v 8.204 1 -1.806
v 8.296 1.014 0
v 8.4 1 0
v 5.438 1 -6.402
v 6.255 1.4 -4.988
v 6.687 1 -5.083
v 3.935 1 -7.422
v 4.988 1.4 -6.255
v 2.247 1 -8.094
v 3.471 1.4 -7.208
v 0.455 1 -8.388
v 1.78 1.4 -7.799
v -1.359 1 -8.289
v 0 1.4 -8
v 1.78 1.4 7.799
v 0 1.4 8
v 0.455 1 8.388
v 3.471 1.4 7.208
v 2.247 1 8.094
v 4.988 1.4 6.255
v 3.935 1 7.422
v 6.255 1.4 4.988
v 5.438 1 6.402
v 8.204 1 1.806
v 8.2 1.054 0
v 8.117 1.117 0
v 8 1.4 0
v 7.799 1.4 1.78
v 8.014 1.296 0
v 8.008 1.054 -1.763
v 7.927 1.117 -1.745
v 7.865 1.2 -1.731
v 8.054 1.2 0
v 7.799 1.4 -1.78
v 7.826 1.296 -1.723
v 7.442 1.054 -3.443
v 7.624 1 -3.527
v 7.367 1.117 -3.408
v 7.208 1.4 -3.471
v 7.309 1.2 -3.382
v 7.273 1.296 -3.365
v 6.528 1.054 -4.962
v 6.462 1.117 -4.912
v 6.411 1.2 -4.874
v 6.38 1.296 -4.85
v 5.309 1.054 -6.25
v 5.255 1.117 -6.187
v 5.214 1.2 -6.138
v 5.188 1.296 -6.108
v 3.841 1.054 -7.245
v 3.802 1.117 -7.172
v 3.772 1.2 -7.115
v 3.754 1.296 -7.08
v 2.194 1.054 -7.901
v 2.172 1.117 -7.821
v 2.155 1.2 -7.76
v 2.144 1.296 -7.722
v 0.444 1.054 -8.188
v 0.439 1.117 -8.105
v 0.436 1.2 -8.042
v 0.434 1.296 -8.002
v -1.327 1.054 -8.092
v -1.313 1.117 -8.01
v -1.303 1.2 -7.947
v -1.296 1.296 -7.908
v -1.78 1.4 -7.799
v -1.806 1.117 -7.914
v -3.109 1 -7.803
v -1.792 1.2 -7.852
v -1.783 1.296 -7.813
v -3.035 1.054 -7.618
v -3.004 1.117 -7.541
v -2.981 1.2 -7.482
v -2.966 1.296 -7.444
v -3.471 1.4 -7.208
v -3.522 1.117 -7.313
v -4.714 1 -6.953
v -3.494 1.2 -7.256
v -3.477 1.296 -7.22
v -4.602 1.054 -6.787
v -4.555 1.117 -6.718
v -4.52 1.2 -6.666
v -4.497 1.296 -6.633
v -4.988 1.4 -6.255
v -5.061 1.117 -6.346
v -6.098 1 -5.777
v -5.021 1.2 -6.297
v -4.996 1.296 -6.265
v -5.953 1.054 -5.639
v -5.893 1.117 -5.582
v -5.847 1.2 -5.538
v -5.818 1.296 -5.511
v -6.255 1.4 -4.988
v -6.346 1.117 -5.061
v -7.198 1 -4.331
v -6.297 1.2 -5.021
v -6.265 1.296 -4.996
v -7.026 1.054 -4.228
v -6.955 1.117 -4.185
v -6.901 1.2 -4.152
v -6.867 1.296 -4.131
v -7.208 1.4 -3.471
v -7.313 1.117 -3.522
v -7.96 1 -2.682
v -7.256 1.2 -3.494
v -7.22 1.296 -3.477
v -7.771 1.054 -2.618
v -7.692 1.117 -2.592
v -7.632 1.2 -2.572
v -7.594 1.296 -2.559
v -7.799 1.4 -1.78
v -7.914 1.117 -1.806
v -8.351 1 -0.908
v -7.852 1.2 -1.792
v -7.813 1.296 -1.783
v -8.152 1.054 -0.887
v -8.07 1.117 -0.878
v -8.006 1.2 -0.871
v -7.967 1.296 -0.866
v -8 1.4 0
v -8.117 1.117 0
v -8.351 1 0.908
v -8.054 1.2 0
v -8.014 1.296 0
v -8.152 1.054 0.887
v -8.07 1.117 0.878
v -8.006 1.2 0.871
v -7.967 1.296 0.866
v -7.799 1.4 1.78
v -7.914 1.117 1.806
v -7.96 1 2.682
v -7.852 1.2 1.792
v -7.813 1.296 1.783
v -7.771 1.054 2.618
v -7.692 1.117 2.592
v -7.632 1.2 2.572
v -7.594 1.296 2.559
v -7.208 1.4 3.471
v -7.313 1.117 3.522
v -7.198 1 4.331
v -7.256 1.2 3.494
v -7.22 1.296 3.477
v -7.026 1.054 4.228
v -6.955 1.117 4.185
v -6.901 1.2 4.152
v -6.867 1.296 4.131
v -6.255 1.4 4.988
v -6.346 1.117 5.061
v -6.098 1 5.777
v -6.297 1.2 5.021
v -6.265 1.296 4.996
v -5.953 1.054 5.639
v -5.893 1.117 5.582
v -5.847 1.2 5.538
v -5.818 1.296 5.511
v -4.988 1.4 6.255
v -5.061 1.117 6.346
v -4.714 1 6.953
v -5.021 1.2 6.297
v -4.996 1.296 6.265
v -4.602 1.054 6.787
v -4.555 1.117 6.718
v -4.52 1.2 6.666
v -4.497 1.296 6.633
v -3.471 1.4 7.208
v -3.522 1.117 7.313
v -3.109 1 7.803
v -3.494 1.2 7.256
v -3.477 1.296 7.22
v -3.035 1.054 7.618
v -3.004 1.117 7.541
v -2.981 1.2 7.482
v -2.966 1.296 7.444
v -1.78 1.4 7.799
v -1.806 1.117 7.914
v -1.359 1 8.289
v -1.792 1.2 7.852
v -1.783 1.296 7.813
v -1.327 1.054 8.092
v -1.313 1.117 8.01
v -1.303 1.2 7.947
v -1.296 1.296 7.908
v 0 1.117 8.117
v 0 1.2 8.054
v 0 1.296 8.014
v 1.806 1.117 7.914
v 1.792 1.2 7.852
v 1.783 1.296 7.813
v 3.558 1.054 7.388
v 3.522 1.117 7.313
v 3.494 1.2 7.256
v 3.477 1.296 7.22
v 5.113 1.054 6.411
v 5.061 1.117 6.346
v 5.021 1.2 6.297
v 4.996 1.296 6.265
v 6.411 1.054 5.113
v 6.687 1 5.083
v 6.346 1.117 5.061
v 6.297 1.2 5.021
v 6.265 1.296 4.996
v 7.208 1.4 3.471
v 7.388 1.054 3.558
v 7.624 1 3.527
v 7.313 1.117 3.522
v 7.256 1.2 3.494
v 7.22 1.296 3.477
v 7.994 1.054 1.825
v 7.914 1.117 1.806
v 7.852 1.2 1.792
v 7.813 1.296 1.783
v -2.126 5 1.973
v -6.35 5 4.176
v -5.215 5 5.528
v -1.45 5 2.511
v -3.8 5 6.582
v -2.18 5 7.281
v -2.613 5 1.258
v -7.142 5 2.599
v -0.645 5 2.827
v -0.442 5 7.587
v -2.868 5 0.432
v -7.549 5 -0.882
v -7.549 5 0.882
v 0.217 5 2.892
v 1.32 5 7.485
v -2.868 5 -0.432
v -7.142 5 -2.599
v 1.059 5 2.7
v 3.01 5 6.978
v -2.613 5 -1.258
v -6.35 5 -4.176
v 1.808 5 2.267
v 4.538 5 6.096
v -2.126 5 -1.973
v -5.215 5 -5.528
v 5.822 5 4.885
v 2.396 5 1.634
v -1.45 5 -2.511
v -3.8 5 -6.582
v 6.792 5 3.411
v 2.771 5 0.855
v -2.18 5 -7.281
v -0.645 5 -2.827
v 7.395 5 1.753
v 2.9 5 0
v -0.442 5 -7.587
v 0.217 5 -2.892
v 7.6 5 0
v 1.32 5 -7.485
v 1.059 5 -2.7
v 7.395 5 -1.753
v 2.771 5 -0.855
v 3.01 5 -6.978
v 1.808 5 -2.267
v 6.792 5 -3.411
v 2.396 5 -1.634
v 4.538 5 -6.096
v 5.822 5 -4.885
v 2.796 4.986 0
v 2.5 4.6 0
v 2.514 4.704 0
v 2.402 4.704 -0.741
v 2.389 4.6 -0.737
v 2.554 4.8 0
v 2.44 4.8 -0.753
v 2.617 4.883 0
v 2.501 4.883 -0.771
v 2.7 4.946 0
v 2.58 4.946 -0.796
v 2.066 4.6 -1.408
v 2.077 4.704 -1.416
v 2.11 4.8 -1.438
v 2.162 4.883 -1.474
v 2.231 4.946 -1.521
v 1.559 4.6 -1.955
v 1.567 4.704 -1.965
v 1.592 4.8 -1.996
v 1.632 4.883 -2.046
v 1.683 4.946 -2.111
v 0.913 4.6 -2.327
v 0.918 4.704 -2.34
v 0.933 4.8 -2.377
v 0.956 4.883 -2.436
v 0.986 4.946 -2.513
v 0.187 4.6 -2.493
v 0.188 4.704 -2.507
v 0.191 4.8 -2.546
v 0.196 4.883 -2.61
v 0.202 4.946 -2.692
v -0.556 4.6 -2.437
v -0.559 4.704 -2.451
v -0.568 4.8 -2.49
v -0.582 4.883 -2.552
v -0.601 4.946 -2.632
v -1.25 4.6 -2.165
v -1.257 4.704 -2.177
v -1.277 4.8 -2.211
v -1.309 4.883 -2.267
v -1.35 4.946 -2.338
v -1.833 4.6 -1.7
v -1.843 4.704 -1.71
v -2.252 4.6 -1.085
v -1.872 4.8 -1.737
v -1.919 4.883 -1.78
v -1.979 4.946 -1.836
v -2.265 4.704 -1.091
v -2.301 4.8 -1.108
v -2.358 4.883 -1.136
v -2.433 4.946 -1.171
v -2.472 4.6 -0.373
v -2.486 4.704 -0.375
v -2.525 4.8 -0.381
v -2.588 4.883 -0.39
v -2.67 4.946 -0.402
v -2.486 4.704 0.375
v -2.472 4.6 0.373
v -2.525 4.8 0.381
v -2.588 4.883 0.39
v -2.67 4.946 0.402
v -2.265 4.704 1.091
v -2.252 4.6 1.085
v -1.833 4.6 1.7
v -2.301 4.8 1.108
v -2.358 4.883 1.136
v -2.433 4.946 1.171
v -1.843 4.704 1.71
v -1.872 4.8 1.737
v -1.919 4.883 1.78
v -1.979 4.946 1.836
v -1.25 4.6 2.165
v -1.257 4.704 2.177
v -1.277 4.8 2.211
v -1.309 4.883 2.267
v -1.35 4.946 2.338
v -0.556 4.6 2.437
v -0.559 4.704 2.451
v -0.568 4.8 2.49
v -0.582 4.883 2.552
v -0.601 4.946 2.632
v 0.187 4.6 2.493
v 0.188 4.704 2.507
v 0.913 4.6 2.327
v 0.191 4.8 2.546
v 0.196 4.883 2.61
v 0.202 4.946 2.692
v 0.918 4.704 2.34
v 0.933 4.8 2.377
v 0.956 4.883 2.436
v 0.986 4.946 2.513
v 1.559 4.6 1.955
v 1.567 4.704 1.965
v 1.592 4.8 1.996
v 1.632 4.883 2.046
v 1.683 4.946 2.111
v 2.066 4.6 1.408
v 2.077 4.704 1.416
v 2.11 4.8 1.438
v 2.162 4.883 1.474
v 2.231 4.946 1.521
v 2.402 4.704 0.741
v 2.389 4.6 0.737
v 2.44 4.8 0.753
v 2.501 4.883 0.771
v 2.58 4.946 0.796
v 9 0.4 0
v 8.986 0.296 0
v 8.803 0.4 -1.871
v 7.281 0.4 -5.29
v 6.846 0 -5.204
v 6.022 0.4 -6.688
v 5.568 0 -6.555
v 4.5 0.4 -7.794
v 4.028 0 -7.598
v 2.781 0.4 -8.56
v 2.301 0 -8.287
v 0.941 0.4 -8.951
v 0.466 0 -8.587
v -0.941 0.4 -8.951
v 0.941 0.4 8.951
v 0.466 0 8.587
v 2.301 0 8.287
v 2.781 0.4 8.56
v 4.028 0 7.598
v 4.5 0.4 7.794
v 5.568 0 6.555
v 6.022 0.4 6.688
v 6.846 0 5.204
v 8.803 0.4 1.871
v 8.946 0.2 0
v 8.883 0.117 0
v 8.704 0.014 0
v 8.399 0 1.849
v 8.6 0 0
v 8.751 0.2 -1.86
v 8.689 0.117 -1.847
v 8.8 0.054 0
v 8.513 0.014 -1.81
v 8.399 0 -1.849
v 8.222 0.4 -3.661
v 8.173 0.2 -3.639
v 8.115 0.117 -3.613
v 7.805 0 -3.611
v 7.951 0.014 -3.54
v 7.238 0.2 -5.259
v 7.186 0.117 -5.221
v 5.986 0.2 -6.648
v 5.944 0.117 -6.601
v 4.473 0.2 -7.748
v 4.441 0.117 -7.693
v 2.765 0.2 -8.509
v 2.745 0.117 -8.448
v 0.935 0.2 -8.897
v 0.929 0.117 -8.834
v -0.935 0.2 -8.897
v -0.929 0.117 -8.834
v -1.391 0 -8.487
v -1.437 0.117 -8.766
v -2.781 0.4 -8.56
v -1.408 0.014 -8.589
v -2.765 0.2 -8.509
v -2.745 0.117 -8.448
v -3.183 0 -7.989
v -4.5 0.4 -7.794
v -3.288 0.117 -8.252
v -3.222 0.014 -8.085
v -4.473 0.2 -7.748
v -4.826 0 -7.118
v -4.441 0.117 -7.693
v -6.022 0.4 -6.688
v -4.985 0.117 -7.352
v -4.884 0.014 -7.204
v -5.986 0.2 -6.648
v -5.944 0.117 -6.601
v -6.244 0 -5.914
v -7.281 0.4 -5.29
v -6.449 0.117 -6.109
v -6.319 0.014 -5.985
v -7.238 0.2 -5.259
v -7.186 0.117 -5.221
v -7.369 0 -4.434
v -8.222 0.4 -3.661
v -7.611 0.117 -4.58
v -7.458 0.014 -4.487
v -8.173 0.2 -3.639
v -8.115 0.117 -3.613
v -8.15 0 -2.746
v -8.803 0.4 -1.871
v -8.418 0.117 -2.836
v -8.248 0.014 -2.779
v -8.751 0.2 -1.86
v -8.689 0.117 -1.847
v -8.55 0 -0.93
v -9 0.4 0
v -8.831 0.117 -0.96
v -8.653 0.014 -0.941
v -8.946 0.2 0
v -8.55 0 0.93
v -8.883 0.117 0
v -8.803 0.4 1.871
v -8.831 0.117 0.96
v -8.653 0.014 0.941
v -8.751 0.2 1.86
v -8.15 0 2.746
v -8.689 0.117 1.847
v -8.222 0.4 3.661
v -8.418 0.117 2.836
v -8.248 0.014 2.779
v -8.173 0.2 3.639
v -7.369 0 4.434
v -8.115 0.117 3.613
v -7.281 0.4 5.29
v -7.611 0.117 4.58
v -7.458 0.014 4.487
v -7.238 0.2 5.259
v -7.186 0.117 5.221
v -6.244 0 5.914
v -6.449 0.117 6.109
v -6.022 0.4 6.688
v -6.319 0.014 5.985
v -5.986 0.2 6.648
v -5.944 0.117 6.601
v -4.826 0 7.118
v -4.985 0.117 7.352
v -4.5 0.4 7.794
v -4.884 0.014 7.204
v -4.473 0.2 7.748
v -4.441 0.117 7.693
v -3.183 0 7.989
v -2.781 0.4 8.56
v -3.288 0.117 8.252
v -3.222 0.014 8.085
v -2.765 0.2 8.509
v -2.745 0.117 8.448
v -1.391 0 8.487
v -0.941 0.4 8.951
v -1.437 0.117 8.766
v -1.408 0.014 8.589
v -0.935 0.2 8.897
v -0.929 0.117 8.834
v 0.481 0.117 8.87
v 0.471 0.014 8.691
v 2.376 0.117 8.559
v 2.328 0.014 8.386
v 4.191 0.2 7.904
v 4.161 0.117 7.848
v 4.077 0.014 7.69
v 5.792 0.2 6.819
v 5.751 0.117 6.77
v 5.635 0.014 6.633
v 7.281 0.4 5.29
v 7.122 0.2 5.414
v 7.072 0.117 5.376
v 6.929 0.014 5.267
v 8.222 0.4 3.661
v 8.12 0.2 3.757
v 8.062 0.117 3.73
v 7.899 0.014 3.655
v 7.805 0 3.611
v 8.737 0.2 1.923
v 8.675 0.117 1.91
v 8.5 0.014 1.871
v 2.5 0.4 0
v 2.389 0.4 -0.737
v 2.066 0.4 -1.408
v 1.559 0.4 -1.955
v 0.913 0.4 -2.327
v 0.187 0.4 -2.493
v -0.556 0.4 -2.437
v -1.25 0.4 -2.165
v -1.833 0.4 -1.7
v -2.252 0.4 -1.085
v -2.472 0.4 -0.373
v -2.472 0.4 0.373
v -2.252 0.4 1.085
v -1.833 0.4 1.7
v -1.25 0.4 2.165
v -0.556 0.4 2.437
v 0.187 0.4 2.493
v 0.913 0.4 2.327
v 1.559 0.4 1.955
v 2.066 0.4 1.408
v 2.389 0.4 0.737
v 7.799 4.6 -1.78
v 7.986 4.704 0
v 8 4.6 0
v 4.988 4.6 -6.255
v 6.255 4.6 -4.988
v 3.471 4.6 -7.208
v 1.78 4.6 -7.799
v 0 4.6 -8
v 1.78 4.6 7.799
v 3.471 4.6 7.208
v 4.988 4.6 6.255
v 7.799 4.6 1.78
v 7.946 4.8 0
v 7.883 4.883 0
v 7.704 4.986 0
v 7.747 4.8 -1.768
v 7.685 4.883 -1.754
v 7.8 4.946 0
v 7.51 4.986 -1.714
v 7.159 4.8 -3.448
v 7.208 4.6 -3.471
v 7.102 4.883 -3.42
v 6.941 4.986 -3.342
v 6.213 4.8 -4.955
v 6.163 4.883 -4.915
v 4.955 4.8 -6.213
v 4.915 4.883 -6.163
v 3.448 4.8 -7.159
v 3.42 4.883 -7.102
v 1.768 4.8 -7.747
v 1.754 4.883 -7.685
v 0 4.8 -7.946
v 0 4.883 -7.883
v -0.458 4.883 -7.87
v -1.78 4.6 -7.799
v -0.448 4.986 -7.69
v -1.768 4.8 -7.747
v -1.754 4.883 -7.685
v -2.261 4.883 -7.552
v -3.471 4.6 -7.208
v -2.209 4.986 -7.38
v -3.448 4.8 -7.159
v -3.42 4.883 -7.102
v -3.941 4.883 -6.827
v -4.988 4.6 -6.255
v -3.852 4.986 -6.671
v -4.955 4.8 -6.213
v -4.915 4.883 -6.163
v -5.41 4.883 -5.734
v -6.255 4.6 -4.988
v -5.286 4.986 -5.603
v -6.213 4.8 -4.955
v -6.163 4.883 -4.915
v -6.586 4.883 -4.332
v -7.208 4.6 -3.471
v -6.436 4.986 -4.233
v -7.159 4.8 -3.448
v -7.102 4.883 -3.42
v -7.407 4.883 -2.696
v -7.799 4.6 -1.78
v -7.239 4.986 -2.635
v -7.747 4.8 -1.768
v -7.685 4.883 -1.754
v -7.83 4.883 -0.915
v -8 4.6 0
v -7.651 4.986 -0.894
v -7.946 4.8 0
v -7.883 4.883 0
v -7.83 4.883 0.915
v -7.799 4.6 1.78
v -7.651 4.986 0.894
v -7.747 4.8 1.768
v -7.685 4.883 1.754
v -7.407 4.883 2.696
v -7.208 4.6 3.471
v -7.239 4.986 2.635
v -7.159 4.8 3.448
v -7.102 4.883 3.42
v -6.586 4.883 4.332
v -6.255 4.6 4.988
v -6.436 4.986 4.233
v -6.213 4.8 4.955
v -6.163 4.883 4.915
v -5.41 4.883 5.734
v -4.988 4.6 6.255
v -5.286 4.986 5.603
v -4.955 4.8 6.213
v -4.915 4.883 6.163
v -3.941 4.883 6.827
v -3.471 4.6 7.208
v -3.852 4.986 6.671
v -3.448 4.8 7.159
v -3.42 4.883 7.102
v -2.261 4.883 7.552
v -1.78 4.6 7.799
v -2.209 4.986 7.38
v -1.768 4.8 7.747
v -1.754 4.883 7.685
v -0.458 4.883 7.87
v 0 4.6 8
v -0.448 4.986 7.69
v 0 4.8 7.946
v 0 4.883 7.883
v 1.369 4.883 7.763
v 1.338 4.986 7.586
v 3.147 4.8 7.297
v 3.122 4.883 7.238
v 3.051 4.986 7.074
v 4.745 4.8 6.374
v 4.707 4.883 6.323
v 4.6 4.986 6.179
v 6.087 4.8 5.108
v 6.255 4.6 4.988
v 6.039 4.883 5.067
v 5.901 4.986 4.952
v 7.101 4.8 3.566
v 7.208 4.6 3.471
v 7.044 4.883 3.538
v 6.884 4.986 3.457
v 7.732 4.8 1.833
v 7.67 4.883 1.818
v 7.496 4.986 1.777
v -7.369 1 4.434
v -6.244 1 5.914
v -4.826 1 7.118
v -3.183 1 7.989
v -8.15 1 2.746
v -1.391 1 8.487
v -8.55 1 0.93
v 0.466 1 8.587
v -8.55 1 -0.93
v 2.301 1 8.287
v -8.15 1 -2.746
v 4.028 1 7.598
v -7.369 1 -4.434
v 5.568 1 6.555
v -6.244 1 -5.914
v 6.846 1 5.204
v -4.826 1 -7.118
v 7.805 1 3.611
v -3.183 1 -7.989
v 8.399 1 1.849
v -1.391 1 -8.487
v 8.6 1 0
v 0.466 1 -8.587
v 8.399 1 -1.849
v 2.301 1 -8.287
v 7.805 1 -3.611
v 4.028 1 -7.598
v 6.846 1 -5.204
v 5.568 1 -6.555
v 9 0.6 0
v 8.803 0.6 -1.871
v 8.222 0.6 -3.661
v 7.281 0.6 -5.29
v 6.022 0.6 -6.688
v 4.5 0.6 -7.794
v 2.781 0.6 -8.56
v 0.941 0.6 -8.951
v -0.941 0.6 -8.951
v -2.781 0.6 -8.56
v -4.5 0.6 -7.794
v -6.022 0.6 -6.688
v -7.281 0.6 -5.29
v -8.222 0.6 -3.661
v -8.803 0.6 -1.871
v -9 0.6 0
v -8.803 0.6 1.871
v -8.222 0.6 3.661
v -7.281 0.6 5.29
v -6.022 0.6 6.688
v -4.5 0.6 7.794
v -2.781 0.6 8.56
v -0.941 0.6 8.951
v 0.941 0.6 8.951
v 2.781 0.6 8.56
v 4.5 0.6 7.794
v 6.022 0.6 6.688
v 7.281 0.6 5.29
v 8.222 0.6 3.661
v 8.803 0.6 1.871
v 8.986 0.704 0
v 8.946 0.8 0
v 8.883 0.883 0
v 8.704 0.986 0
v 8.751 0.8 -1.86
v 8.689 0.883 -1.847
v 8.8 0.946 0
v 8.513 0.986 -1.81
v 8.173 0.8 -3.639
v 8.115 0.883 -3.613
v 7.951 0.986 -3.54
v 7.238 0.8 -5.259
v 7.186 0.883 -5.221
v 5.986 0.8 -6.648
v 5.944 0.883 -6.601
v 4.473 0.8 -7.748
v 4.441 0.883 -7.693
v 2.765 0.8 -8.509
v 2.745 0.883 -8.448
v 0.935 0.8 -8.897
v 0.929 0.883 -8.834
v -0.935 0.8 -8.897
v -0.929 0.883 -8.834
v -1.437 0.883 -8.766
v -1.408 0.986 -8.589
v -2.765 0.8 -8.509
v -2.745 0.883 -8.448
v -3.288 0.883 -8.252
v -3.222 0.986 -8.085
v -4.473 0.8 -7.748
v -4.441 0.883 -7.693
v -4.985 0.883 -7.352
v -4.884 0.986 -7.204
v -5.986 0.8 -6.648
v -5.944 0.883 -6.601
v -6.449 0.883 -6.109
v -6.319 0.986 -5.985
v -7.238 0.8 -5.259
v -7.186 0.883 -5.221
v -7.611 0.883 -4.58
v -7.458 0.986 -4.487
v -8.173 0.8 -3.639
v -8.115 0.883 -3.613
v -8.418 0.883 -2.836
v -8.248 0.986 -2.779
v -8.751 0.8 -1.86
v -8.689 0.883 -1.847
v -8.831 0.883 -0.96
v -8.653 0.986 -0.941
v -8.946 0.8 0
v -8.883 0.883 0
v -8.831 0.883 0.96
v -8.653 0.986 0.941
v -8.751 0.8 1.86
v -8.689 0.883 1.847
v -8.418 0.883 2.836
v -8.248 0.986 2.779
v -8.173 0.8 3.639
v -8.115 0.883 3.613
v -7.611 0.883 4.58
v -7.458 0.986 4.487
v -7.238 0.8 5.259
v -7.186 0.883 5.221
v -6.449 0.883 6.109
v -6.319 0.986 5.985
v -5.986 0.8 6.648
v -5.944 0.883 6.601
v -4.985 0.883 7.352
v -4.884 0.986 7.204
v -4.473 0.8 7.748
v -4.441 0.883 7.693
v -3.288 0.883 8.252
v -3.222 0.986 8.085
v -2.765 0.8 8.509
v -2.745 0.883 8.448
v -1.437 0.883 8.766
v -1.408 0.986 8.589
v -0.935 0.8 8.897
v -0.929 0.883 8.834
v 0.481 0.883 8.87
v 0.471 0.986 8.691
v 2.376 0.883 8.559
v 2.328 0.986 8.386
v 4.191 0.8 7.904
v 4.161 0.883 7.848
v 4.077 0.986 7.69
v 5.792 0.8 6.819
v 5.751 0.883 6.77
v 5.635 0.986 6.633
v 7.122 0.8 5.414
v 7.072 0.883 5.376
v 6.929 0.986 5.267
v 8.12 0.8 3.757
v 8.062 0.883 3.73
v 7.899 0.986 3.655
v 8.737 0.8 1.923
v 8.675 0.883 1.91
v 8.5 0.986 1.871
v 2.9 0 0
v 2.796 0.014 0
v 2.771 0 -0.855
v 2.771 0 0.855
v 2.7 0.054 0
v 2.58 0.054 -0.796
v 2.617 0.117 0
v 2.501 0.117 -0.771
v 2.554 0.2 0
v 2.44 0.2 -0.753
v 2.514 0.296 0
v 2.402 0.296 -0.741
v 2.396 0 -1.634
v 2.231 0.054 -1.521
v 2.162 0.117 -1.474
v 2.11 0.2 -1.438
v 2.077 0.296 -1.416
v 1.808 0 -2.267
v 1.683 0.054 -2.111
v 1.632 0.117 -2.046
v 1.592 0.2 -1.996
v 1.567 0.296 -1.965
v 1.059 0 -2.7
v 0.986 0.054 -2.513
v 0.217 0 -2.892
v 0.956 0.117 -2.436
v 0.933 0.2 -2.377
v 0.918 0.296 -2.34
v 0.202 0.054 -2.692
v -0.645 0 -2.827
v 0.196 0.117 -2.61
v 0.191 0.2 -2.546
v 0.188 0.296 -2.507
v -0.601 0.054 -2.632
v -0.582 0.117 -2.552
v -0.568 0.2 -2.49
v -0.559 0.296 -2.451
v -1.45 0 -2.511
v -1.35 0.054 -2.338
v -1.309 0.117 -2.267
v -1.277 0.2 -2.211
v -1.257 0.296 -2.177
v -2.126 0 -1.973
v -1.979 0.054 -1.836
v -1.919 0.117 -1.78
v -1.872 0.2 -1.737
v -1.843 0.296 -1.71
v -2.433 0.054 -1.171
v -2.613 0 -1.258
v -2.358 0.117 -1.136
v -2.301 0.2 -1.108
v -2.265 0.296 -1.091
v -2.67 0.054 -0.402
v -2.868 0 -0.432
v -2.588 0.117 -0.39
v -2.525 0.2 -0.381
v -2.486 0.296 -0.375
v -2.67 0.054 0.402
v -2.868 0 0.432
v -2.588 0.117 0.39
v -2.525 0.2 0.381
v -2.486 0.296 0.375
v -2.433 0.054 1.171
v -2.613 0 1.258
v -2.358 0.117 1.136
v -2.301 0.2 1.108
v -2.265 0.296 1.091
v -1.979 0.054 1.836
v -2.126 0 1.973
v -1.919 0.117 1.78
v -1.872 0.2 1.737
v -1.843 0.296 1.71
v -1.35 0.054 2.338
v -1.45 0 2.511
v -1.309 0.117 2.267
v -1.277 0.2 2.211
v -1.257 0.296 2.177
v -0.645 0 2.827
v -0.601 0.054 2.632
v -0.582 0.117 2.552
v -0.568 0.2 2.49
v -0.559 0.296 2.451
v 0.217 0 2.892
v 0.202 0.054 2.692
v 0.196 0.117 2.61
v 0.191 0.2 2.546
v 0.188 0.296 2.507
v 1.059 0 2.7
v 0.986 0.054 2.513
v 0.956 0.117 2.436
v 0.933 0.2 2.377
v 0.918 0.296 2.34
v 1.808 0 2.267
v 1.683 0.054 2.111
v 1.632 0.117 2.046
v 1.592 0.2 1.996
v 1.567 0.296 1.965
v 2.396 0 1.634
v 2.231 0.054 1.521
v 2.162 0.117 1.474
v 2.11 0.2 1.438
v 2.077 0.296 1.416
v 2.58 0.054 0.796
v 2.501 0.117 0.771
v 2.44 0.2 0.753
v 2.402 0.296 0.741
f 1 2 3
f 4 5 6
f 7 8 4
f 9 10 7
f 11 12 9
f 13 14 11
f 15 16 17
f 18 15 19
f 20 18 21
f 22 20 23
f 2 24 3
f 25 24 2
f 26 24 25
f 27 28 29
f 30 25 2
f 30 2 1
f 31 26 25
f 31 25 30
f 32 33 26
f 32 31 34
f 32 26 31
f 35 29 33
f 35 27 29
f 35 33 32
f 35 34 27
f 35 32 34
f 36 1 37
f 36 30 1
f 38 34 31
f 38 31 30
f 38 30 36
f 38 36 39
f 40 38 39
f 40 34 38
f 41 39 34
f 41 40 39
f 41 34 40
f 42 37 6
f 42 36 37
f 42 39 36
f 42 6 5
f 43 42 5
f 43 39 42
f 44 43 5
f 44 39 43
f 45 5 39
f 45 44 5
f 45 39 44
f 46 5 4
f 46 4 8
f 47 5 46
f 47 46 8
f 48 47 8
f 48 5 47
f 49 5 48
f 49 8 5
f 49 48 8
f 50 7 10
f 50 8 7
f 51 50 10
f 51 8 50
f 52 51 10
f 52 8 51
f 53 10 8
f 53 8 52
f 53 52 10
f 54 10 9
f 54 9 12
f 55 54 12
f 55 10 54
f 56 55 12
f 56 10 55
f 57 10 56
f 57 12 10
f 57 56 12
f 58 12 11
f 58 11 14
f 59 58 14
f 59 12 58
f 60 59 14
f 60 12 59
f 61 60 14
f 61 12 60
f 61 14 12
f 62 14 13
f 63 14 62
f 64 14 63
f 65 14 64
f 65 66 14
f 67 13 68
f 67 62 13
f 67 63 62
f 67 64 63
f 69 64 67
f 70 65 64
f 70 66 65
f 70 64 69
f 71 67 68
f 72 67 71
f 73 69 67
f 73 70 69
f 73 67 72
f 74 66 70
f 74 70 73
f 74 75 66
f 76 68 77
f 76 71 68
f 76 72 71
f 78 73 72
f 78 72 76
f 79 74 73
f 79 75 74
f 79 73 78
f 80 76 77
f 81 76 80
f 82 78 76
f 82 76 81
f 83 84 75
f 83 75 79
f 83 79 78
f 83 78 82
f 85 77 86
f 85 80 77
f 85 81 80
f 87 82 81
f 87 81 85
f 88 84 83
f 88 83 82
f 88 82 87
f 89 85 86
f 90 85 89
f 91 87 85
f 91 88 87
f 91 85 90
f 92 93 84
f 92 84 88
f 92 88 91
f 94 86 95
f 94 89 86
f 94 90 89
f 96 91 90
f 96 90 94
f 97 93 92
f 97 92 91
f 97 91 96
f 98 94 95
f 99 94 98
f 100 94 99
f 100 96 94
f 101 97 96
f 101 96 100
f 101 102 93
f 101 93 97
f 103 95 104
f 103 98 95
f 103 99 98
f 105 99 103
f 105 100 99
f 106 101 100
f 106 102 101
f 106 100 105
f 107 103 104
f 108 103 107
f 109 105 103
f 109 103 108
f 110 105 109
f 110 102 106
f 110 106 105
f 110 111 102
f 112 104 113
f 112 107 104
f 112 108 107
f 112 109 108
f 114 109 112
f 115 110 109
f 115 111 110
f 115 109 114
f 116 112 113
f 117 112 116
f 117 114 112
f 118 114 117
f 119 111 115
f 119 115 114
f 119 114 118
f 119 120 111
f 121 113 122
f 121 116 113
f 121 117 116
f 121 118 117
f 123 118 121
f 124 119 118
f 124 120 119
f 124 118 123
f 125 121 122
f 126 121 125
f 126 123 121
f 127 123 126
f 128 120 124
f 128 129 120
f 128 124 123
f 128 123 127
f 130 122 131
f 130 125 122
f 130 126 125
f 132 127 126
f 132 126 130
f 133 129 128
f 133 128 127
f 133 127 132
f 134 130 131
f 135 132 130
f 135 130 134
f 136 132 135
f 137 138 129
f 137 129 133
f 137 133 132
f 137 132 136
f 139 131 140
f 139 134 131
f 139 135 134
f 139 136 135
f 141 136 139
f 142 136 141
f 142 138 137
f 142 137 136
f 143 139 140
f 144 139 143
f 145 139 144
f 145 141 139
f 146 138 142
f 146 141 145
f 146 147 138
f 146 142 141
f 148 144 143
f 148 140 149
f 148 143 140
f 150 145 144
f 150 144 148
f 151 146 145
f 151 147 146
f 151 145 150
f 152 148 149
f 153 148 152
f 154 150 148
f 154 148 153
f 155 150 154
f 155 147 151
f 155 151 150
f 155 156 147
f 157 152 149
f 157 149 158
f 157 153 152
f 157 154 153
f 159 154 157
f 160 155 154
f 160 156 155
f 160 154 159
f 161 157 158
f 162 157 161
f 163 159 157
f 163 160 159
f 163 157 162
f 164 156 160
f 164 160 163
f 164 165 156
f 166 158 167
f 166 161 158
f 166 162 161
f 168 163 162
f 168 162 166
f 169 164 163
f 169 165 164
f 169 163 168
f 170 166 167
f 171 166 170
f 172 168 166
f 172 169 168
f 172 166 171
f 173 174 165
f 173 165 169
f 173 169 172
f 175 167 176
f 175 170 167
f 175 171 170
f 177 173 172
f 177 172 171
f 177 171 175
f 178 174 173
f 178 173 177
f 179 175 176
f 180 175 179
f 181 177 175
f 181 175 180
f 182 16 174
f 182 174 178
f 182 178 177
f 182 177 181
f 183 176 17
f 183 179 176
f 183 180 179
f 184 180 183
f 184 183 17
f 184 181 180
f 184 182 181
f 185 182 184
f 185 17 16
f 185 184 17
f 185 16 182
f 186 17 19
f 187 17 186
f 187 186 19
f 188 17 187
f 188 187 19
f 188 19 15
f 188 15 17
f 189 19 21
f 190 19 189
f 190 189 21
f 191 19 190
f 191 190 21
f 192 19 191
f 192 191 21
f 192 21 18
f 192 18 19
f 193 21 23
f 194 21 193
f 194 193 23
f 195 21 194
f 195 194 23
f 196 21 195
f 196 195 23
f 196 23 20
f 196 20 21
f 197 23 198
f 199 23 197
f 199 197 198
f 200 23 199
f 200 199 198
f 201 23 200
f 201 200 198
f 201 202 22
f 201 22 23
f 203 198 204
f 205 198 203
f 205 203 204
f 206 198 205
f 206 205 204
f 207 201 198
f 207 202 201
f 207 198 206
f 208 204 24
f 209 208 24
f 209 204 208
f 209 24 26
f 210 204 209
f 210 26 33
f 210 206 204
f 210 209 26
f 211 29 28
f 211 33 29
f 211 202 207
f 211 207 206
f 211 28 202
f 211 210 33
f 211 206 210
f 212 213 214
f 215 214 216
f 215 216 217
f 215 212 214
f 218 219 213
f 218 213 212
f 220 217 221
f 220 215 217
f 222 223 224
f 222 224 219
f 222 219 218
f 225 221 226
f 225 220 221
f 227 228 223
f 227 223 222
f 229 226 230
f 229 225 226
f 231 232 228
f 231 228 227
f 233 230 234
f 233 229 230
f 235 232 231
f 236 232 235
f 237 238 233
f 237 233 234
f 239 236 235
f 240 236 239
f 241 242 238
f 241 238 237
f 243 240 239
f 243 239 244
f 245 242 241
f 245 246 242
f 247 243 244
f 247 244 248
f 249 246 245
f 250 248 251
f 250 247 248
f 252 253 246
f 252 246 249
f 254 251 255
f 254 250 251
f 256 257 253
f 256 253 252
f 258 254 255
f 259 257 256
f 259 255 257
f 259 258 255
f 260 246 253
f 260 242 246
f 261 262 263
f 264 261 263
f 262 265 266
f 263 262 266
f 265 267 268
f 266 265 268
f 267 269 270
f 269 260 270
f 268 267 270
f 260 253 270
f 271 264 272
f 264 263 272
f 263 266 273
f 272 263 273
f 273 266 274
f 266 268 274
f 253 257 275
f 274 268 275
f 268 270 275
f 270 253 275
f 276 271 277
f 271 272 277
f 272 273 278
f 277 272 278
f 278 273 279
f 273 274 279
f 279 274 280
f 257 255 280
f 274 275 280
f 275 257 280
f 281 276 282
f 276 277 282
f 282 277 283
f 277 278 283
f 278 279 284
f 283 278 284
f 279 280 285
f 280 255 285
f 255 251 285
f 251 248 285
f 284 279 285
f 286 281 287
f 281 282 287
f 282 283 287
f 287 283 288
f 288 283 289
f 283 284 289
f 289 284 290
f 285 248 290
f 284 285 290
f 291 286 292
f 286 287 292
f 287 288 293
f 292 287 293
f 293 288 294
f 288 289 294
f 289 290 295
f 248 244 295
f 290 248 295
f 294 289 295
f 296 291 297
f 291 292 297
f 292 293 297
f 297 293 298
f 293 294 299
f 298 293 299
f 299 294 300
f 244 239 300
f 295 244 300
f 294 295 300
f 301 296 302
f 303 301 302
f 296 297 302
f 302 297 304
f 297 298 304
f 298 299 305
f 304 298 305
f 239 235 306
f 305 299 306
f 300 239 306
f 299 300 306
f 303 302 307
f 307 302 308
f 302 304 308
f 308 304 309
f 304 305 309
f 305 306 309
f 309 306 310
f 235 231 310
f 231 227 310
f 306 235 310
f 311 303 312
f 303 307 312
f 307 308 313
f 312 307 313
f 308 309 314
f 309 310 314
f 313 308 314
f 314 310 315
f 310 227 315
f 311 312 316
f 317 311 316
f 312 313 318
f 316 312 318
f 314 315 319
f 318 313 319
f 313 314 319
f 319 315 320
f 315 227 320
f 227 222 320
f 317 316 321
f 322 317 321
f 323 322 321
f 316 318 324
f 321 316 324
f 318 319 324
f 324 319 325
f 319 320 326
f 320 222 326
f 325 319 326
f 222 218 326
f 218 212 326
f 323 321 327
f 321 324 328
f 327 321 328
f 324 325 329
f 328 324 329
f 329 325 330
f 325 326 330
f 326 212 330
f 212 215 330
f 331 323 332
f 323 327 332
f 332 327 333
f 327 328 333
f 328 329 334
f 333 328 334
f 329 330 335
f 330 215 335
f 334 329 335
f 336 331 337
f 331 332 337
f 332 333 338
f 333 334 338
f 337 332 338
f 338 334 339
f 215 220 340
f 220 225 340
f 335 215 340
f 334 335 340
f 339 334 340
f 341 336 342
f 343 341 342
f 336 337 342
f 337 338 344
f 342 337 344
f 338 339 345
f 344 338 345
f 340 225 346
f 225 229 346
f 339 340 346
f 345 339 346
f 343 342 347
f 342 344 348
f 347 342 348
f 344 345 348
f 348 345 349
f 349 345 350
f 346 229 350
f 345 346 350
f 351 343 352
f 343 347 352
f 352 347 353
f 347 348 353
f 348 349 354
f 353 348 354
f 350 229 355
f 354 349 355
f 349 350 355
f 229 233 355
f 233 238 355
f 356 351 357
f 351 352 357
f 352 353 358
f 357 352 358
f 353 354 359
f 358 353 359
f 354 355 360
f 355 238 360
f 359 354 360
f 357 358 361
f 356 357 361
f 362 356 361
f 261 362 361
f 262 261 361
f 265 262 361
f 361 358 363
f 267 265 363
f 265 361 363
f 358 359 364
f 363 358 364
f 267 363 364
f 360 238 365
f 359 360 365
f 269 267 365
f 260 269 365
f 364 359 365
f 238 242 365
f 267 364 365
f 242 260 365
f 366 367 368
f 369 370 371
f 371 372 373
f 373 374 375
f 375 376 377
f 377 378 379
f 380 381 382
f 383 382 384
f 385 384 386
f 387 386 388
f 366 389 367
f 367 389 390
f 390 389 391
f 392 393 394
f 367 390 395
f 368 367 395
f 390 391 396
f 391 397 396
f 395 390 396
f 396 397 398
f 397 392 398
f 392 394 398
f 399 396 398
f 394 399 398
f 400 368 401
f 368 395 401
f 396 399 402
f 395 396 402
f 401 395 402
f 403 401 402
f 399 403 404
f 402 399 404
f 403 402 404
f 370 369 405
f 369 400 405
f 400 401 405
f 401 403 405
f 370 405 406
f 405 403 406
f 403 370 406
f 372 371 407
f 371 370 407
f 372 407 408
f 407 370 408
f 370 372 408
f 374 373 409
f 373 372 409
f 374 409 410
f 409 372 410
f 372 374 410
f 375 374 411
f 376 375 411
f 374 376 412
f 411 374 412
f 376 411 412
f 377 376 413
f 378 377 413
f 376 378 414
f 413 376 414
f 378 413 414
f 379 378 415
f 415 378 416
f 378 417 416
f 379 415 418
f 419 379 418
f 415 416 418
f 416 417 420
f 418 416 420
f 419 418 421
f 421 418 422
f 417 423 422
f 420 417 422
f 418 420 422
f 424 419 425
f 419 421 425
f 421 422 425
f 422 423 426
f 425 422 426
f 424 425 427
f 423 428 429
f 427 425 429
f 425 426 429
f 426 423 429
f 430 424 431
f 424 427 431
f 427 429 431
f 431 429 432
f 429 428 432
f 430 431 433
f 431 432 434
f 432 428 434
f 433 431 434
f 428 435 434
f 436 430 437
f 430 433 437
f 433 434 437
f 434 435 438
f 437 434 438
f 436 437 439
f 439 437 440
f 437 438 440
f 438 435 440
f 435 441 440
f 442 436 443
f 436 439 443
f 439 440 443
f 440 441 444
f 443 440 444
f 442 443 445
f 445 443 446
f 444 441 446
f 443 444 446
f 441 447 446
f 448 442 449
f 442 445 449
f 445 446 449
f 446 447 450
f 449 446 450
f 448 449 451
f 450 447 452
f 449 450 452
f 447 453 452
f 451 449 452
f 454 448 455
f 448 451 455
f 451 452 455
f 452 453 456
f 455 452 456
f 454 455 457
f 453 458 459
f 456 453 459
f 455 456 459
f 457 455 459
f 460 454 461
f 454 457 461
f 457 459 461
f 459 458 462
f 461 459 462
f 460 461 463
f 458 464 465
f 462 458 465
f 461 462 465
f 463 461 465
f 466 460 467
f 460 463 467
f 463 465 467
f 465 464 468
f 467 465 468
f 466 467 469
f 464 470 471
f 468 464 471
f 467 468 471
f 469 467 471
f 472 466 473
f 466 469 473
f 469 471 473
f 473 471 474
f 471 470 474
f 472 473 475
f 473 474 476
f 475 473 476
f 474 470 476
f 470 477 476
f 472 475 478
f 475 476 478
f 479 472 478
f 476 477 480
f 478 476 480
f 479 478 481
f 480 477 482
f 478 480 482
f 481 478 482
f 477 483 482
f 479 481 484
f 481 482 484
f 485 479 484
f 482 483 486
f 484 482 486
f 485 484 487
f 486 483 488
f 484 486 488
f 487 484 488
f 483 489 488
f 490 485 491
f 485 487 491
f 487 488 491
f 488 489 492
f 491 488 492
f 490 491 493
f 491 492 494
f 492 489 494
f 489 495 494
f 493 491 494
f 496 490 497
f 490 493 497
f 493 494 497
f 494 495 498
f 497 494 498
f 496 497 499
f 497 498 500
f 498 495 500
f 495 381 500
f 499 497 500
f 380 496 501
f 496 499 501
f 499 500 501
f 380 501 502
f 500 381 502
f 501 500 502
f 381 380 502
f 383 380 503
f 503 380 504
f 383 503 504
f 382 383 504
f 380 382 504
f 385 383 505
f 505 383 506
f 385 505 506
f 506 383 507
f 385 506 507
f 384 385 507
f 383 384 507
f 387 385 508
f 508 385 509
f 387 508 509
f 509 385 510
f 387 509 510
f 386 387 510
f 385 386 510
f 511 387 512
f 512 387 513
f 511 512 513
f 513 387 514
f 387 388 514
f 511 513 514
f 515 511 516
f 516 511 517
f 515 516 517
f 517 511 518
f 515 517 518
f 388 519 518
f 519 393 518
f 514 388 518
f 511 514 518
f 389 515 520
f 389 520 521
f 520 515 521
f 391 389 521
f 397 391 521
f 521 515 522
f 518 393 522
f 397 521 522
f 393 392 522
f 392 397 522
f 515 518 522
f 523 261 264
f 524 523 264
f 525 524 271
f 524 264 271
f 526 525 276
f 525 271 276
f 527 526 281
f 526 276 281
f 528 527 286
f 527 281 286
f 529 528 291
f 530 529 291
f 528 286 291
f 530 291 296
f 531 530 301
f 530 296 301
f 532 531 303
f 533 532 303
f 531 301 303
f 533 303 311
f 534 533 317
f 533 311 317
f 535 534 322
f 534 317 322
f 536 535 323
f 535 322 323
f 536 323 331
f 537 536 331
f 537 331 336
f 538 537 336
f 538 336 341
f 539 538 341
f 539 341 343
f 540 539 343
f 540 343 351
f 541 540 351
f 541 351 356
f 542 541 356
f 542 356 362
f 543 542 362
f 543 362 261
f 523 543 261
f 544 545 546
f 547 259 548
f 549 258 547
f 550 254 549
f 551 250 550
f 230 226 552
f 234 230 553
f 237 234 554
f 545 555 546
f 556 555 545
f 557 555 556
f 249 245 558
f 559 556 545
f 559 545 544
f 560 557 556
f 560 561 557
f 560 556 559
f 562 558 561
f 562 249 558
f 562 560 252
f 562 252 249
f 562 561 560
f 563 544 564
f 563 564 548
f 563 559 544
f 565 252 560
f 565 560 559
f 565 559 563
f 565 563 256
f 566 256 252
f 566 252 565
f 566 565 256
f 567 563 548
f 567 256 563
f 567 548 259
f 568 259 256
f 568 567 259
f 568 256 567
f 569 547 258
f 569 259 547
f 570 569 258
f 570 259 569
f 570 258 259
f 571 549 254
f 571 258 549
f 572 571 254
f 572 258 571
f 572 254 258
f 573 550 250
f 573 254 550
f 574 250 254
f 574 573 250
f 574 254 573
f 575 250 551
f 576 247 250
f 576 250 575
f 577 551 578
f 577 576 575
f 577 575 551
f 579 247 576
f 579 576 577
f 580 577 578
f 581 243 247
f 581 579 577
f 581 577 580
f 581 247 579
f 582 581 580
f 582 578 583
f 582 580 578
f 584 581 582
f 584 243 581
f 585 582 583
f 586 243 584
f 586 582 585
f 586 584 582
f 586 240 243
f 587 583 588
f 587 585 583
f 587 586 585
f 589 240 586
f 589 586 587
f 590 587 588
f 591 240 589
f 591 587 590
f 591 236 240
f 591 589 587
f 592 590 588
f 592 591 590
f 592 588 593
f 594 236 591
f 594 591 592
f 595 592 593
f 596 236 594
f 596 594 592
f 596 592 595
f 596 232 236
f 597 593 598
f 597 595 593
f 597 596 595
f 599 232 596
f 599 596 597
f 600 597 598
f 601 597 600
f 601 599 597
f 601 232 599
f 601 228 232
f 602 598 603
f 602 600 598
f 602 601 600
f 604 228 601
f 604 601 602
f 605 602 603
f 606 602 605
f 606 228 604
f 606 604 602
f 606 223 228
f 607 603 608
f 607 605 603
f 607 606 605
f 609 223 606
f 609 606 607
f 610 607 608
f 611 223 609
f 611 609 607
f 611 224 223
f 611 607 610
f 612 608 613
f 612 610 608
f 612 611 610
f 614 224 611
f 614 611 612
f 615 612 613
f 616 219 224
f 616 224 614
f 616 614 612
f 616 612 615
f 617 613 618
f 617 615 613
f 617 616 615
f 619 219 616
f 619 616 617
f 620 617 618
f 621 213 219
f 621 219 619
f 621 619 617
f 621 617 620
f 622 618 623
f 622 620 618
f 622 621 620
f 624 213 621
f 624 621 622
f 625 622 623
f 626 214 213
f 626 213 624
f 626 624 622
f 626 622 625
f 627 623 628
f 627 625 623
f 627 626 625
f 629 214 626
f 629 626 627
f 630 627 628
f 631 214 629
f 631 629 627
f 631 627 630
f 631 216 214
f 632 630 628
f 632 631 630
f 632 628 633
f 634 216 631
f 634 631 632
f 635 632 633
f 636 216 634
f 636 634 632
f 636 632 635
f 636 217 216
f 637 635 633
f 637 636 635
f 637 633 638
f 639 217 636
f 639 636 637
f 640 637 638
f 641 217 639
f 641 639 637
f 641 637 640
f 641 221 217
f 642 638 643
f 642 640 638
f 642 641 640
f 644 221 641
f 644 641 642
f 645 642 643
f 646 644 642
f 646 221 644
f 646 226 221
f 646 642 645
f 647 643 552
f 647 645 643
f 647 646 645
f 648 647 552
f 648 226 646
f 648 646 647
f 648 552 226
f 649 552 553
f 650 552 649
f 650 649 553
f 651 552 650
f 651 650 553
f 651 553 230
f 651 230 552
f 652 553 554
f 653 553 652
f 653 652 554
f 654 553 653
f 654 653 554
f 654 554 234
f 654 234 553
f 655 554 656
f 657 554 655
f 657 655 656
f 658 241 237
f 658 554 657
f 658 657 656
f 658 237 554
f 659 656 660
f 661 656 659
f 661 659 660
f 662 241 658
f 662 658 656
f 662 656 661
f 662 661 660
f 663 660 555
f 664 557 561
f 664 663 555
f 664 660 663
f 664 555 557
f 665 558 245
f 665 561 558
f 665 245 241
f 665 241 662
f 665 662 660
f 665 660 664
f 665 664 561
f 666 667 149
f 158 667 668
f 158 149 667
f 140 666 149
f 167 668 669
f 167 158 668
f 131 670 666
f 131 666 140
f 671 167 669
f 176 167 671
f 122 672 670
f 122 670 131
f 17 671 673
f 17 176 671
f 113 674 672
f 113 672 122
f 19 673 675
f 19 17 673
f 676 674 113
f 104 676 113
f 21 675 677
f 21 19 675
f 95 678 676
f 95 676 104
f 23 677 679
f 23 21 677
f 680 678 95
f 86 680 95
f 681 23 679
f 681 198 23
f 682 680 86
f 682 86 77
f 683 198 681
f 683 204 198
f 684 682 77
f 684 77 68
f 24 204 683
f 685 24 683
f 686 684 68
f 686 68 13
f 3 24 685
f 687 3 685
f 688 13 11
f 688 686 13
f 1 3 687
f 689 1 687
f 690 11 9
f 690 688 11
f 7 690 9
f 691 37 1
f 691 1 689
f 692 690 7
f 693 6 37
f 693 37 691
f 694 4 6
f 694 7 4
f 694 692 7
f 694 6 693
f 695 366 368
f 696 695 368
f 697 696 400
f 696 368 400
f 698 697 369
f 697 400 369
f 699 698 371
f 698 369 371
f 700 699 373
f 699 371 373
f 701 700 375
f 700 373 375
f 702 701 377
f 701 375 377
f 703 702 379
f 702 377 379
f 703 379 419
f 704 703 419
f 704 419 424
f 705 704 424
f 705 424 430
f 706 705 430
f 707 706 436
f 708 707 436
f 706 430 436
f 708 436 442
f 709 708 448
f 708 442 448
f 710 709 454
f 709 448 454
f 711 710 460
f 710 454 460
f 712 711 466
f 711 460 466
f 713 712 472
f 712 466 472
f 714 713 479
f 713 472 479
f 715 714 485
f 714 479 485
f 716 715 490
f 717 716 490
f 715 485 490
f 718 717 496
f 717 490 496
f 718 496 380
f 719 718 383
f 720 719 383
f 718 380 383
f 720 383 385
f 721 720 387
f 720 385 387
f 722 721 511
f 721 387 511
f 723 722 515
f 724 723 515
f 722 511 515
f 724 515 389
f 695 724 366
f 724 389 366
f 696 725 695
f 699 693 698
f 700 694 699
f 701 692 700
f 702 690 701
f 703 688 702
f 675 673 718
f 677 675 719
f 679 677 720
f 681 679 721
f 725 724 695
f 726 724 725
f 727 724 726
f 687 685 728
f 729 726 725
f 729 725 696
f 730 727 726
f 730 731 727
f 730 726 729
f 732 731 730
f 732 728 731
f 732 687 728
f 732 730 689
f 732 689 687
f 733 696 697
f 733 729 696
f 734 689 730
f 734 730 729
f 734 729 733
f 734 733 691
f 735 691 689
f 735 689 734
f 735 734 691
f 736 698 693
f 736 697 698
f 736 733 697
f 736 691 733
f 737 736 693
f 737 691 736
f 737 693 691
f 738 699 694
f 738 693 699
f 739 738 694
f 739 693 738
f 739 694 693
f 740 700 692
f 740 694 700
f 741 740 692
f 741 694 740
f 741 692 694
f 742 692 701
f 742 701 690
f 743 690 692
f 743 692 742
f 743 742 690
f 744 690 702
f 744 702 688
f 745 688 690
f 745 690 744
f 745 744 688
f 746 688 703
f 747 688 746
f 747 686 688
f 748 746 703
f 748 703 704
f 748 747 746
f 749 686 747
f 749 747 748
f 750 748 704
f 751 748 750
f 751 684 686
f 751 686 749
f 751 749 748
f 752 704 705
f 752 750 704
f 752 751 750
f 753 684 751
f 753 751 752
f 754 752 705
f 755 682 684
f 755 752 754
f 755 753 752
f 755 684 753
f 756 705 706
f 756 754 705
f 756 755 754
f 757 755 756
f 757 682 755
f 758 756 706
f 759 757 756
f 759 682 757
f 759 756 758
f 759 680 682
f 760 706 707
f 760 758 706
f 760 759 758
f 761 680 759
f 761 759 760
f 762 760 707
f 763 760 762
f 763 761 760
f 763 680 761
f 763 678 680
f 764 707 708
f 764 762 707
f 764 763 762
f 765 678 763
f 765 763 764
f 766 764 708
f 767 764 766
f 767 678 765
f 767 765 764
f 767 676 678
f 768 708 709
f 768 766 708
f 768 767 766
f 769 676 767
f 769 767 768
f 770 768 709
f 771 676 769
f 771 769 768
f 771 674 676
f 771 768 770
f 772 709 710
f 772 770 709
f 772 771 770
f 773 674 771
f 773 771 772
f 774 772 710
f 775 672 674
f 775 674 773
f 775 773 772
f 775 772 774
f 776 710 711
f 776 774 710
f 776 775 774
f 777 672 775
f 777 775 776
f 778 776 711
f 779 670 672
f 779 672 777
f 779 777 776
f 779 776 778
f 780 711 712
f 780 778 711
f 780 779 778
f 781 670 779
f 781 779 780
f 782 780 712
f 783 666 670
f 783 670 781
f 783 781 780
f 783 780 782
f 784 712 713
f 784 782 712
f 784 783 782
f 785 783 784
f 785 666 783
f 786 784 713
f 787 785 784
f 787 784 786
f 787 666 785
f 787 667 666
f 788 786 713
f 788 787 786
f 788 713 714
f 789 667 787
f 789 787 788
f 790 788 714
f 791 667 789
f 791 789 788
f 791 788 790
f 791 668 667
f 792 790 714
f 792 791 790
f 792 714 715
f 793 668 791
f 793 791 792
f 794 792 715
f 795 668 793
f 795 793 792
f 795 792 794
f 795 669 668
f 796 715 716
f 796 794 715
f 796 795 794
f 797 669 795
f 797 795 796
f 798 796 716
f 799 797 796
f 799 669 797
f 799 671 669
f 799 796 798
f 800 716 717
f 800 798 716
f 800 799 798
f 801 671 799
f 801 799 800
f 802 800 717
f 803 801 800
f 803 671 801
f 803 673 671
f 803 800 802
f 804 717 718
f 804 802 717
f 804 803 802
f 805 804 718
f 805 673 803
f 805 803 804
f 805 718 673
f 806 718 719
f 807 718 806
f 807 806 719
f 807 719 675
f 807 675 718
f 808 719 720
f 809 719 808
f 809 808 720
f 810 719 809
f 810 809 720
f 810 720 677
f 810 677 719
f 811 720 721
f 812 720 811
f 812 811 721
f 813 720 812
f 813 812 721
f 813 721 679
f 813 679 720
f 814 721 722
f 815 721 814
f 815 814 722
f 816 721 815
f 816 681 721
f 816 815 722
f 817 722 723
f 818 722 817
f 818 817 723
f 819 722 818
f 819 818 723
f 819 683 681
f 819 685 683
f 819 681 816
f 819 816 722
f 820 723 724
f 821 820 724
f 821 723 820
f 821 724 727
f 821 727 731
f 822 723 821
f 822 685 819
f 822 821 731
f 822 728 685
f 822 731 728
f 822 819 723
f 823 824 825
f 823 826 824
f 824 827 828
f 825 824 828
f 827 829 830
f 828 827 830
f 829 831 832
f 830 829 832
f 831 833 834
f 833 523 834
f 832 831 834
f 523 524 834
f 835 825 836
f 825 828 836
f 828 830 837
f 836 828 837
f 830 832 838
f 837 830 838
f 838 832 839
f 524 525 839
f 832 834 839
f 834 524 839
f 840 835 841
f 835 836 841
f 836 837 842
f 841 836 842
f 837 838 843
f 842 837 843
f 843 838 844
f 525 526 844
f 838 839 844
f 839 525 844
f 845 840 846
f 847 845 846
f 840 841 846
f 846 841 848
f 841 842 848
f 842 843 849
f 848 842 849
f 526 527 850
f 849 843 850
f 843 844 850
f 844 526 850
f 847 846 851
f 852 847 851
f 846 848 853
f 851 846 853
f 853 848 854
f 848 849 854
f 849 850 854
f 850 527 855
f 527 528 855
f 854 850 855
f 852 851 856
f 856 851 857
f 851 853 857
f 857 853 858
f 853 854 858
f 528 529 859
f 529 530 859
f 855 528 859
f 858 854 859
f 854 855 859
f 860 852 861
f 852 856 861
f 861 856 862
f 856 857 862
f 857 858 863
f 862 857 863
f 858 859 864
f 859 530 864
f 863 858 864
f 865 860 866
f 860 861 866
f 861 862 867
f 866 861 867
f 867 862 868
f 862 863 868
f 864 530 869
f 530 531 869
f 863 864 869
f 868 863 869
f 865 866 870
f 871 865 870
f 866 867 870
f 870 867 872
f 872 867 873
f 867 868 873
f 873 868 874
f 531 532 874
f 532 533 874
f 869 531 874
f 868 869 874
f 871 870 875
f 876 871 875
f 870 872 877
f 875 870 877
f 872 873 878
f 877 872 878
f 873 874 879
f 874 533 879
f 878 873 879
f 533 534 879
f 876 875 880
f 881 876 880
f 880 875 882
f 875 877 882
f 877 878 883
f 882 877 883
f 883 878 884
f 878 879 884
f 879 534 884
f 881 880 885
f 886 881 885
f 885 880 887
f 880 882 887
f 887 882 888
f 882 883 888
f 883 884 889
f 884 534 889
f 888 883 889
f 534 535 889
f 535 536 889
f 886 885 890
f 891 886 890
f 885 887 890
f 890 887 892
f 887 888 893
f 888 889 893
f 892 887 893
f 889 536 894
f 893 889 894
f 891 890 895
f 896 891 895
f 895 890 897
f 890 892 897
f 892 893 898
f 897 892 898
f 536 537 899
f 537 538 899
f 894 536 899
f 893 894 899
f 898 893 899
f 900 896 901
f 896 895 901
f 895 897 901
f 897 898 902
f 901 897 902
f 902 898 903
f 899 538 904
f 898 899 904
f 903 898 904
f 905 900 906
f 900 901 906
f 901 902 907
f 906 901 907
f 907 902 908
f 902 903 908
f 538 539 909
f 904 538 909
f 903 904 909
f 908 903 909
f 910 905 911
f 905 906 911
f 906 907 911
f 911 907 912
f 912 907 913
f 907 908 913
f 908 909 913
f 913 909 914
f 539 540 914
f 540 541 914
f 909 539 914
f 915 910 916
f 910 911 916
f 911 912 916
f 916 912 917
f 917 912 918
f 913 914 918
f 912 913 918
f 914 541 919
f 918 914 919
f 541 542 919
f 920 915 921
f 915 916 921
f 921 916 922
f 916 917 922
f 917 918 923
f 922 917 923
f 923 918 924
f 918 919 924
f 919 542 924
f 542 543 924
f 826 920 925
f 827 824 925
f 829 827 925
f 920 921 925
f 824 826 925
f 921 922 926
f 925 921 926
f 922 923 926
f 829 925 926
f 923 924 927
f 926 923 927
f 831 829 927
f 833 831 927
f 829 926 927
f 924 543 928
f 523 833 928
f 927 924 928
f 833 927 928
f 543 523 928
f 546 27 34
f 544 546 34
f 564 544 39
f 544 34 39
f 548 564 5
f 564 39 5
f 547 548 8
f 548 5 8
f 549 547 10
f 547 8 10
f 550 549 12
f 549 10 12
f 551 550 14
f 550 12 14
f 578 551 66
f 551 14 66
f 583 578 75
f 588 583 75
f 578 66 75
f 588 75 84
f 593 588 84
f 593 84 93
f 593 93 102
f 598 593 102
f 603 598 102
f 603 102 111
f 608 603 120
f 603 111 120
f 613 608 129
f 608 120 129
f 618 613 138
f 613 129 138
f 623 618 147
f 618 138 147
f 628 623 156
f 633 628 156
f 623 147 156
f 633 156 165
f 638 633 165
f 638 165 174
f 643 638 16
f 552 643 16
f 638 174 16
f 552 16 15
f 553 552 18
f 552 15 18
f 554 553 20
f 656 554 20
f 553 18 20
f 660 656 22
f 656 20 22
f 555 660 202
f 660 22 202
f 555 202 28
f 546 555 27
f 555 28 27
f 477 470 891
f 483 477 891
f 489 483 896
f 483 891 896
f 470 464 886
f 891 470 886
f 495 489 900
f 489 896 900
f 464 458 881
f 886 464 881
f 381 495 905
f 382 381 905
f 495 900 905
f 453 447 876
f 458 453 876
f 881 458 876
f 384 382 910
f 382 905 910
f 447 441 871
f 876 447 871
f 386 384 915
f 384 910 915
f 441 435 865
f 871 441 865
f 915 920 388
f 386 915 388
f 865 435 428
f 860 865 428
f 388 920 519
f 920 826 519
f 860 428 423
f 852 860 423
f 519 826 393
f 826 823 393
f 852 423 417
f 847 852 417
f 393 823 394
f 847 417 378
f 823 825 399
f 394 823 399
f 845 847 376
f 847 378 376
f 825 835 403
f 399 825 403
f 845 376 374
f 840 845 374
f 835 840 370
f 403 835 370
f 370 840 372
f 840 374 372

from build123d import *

# Parameters (mm, degrees)
SKETCH1_R           = 9
BOSS_EXTRUDE1_DEPTH = 1
SKETCH2_R           = 8
BOSS_EXTRUDE2_DEPTH = 4
SKETCH3_R           = 2.5
CUT_EXTRUDE1_DEPTH  = 6
FILLET1_R           = 0.4


with BuildPart() as part:
    # Sketch1 → Boss-Extrude1 (new body)
    with BuildSketch(Plane(origin=(0, 0, 0), x_dir=(1, 0, 0), z_dir=(0, 1, 0))):
        Circle(SKETCH1_R)
    extrude(amount=BOSS_EXTRUDE1_DEPTH)

    # Sketch2 → Boss-Extrude2 (add)
    with BuildSketch(Plane(origin=(0, 1, 0), x_dir=(1, 0, 0), z_dir=(0, 1, 0))):
        Circle(SKETCH2_R)
    extrude(amount=BOSS_EXTRUDE2_DEPTH)

    # Sketch3 → Cut-Extrude1 (cut, through all)
    with BuildSketch(Plane(origin=(0, 5, 0), x_dir=(1, 0, 0), z_dir=(0, 1, 0))):
        Circle(SKETCH3_R)
    extrude(amount=-CUT_EXTRUDE1_DEPTH, mode=Mode.SUBTRACT)

    # Fillet1
    fillet1_edges = [part.edges().sort_by_distance(p)[0] for p in [
        (-2.5, 0, 0),
        (-2.5, 5, 0),
        (-9, 0, 0),
        (-9, 1, 0),
        (-8, 1, 0),
        (-8, 5, 0),
    ]]
    fillet(fillet1_edges, radius=FILLET1_R)


solid = part.part
